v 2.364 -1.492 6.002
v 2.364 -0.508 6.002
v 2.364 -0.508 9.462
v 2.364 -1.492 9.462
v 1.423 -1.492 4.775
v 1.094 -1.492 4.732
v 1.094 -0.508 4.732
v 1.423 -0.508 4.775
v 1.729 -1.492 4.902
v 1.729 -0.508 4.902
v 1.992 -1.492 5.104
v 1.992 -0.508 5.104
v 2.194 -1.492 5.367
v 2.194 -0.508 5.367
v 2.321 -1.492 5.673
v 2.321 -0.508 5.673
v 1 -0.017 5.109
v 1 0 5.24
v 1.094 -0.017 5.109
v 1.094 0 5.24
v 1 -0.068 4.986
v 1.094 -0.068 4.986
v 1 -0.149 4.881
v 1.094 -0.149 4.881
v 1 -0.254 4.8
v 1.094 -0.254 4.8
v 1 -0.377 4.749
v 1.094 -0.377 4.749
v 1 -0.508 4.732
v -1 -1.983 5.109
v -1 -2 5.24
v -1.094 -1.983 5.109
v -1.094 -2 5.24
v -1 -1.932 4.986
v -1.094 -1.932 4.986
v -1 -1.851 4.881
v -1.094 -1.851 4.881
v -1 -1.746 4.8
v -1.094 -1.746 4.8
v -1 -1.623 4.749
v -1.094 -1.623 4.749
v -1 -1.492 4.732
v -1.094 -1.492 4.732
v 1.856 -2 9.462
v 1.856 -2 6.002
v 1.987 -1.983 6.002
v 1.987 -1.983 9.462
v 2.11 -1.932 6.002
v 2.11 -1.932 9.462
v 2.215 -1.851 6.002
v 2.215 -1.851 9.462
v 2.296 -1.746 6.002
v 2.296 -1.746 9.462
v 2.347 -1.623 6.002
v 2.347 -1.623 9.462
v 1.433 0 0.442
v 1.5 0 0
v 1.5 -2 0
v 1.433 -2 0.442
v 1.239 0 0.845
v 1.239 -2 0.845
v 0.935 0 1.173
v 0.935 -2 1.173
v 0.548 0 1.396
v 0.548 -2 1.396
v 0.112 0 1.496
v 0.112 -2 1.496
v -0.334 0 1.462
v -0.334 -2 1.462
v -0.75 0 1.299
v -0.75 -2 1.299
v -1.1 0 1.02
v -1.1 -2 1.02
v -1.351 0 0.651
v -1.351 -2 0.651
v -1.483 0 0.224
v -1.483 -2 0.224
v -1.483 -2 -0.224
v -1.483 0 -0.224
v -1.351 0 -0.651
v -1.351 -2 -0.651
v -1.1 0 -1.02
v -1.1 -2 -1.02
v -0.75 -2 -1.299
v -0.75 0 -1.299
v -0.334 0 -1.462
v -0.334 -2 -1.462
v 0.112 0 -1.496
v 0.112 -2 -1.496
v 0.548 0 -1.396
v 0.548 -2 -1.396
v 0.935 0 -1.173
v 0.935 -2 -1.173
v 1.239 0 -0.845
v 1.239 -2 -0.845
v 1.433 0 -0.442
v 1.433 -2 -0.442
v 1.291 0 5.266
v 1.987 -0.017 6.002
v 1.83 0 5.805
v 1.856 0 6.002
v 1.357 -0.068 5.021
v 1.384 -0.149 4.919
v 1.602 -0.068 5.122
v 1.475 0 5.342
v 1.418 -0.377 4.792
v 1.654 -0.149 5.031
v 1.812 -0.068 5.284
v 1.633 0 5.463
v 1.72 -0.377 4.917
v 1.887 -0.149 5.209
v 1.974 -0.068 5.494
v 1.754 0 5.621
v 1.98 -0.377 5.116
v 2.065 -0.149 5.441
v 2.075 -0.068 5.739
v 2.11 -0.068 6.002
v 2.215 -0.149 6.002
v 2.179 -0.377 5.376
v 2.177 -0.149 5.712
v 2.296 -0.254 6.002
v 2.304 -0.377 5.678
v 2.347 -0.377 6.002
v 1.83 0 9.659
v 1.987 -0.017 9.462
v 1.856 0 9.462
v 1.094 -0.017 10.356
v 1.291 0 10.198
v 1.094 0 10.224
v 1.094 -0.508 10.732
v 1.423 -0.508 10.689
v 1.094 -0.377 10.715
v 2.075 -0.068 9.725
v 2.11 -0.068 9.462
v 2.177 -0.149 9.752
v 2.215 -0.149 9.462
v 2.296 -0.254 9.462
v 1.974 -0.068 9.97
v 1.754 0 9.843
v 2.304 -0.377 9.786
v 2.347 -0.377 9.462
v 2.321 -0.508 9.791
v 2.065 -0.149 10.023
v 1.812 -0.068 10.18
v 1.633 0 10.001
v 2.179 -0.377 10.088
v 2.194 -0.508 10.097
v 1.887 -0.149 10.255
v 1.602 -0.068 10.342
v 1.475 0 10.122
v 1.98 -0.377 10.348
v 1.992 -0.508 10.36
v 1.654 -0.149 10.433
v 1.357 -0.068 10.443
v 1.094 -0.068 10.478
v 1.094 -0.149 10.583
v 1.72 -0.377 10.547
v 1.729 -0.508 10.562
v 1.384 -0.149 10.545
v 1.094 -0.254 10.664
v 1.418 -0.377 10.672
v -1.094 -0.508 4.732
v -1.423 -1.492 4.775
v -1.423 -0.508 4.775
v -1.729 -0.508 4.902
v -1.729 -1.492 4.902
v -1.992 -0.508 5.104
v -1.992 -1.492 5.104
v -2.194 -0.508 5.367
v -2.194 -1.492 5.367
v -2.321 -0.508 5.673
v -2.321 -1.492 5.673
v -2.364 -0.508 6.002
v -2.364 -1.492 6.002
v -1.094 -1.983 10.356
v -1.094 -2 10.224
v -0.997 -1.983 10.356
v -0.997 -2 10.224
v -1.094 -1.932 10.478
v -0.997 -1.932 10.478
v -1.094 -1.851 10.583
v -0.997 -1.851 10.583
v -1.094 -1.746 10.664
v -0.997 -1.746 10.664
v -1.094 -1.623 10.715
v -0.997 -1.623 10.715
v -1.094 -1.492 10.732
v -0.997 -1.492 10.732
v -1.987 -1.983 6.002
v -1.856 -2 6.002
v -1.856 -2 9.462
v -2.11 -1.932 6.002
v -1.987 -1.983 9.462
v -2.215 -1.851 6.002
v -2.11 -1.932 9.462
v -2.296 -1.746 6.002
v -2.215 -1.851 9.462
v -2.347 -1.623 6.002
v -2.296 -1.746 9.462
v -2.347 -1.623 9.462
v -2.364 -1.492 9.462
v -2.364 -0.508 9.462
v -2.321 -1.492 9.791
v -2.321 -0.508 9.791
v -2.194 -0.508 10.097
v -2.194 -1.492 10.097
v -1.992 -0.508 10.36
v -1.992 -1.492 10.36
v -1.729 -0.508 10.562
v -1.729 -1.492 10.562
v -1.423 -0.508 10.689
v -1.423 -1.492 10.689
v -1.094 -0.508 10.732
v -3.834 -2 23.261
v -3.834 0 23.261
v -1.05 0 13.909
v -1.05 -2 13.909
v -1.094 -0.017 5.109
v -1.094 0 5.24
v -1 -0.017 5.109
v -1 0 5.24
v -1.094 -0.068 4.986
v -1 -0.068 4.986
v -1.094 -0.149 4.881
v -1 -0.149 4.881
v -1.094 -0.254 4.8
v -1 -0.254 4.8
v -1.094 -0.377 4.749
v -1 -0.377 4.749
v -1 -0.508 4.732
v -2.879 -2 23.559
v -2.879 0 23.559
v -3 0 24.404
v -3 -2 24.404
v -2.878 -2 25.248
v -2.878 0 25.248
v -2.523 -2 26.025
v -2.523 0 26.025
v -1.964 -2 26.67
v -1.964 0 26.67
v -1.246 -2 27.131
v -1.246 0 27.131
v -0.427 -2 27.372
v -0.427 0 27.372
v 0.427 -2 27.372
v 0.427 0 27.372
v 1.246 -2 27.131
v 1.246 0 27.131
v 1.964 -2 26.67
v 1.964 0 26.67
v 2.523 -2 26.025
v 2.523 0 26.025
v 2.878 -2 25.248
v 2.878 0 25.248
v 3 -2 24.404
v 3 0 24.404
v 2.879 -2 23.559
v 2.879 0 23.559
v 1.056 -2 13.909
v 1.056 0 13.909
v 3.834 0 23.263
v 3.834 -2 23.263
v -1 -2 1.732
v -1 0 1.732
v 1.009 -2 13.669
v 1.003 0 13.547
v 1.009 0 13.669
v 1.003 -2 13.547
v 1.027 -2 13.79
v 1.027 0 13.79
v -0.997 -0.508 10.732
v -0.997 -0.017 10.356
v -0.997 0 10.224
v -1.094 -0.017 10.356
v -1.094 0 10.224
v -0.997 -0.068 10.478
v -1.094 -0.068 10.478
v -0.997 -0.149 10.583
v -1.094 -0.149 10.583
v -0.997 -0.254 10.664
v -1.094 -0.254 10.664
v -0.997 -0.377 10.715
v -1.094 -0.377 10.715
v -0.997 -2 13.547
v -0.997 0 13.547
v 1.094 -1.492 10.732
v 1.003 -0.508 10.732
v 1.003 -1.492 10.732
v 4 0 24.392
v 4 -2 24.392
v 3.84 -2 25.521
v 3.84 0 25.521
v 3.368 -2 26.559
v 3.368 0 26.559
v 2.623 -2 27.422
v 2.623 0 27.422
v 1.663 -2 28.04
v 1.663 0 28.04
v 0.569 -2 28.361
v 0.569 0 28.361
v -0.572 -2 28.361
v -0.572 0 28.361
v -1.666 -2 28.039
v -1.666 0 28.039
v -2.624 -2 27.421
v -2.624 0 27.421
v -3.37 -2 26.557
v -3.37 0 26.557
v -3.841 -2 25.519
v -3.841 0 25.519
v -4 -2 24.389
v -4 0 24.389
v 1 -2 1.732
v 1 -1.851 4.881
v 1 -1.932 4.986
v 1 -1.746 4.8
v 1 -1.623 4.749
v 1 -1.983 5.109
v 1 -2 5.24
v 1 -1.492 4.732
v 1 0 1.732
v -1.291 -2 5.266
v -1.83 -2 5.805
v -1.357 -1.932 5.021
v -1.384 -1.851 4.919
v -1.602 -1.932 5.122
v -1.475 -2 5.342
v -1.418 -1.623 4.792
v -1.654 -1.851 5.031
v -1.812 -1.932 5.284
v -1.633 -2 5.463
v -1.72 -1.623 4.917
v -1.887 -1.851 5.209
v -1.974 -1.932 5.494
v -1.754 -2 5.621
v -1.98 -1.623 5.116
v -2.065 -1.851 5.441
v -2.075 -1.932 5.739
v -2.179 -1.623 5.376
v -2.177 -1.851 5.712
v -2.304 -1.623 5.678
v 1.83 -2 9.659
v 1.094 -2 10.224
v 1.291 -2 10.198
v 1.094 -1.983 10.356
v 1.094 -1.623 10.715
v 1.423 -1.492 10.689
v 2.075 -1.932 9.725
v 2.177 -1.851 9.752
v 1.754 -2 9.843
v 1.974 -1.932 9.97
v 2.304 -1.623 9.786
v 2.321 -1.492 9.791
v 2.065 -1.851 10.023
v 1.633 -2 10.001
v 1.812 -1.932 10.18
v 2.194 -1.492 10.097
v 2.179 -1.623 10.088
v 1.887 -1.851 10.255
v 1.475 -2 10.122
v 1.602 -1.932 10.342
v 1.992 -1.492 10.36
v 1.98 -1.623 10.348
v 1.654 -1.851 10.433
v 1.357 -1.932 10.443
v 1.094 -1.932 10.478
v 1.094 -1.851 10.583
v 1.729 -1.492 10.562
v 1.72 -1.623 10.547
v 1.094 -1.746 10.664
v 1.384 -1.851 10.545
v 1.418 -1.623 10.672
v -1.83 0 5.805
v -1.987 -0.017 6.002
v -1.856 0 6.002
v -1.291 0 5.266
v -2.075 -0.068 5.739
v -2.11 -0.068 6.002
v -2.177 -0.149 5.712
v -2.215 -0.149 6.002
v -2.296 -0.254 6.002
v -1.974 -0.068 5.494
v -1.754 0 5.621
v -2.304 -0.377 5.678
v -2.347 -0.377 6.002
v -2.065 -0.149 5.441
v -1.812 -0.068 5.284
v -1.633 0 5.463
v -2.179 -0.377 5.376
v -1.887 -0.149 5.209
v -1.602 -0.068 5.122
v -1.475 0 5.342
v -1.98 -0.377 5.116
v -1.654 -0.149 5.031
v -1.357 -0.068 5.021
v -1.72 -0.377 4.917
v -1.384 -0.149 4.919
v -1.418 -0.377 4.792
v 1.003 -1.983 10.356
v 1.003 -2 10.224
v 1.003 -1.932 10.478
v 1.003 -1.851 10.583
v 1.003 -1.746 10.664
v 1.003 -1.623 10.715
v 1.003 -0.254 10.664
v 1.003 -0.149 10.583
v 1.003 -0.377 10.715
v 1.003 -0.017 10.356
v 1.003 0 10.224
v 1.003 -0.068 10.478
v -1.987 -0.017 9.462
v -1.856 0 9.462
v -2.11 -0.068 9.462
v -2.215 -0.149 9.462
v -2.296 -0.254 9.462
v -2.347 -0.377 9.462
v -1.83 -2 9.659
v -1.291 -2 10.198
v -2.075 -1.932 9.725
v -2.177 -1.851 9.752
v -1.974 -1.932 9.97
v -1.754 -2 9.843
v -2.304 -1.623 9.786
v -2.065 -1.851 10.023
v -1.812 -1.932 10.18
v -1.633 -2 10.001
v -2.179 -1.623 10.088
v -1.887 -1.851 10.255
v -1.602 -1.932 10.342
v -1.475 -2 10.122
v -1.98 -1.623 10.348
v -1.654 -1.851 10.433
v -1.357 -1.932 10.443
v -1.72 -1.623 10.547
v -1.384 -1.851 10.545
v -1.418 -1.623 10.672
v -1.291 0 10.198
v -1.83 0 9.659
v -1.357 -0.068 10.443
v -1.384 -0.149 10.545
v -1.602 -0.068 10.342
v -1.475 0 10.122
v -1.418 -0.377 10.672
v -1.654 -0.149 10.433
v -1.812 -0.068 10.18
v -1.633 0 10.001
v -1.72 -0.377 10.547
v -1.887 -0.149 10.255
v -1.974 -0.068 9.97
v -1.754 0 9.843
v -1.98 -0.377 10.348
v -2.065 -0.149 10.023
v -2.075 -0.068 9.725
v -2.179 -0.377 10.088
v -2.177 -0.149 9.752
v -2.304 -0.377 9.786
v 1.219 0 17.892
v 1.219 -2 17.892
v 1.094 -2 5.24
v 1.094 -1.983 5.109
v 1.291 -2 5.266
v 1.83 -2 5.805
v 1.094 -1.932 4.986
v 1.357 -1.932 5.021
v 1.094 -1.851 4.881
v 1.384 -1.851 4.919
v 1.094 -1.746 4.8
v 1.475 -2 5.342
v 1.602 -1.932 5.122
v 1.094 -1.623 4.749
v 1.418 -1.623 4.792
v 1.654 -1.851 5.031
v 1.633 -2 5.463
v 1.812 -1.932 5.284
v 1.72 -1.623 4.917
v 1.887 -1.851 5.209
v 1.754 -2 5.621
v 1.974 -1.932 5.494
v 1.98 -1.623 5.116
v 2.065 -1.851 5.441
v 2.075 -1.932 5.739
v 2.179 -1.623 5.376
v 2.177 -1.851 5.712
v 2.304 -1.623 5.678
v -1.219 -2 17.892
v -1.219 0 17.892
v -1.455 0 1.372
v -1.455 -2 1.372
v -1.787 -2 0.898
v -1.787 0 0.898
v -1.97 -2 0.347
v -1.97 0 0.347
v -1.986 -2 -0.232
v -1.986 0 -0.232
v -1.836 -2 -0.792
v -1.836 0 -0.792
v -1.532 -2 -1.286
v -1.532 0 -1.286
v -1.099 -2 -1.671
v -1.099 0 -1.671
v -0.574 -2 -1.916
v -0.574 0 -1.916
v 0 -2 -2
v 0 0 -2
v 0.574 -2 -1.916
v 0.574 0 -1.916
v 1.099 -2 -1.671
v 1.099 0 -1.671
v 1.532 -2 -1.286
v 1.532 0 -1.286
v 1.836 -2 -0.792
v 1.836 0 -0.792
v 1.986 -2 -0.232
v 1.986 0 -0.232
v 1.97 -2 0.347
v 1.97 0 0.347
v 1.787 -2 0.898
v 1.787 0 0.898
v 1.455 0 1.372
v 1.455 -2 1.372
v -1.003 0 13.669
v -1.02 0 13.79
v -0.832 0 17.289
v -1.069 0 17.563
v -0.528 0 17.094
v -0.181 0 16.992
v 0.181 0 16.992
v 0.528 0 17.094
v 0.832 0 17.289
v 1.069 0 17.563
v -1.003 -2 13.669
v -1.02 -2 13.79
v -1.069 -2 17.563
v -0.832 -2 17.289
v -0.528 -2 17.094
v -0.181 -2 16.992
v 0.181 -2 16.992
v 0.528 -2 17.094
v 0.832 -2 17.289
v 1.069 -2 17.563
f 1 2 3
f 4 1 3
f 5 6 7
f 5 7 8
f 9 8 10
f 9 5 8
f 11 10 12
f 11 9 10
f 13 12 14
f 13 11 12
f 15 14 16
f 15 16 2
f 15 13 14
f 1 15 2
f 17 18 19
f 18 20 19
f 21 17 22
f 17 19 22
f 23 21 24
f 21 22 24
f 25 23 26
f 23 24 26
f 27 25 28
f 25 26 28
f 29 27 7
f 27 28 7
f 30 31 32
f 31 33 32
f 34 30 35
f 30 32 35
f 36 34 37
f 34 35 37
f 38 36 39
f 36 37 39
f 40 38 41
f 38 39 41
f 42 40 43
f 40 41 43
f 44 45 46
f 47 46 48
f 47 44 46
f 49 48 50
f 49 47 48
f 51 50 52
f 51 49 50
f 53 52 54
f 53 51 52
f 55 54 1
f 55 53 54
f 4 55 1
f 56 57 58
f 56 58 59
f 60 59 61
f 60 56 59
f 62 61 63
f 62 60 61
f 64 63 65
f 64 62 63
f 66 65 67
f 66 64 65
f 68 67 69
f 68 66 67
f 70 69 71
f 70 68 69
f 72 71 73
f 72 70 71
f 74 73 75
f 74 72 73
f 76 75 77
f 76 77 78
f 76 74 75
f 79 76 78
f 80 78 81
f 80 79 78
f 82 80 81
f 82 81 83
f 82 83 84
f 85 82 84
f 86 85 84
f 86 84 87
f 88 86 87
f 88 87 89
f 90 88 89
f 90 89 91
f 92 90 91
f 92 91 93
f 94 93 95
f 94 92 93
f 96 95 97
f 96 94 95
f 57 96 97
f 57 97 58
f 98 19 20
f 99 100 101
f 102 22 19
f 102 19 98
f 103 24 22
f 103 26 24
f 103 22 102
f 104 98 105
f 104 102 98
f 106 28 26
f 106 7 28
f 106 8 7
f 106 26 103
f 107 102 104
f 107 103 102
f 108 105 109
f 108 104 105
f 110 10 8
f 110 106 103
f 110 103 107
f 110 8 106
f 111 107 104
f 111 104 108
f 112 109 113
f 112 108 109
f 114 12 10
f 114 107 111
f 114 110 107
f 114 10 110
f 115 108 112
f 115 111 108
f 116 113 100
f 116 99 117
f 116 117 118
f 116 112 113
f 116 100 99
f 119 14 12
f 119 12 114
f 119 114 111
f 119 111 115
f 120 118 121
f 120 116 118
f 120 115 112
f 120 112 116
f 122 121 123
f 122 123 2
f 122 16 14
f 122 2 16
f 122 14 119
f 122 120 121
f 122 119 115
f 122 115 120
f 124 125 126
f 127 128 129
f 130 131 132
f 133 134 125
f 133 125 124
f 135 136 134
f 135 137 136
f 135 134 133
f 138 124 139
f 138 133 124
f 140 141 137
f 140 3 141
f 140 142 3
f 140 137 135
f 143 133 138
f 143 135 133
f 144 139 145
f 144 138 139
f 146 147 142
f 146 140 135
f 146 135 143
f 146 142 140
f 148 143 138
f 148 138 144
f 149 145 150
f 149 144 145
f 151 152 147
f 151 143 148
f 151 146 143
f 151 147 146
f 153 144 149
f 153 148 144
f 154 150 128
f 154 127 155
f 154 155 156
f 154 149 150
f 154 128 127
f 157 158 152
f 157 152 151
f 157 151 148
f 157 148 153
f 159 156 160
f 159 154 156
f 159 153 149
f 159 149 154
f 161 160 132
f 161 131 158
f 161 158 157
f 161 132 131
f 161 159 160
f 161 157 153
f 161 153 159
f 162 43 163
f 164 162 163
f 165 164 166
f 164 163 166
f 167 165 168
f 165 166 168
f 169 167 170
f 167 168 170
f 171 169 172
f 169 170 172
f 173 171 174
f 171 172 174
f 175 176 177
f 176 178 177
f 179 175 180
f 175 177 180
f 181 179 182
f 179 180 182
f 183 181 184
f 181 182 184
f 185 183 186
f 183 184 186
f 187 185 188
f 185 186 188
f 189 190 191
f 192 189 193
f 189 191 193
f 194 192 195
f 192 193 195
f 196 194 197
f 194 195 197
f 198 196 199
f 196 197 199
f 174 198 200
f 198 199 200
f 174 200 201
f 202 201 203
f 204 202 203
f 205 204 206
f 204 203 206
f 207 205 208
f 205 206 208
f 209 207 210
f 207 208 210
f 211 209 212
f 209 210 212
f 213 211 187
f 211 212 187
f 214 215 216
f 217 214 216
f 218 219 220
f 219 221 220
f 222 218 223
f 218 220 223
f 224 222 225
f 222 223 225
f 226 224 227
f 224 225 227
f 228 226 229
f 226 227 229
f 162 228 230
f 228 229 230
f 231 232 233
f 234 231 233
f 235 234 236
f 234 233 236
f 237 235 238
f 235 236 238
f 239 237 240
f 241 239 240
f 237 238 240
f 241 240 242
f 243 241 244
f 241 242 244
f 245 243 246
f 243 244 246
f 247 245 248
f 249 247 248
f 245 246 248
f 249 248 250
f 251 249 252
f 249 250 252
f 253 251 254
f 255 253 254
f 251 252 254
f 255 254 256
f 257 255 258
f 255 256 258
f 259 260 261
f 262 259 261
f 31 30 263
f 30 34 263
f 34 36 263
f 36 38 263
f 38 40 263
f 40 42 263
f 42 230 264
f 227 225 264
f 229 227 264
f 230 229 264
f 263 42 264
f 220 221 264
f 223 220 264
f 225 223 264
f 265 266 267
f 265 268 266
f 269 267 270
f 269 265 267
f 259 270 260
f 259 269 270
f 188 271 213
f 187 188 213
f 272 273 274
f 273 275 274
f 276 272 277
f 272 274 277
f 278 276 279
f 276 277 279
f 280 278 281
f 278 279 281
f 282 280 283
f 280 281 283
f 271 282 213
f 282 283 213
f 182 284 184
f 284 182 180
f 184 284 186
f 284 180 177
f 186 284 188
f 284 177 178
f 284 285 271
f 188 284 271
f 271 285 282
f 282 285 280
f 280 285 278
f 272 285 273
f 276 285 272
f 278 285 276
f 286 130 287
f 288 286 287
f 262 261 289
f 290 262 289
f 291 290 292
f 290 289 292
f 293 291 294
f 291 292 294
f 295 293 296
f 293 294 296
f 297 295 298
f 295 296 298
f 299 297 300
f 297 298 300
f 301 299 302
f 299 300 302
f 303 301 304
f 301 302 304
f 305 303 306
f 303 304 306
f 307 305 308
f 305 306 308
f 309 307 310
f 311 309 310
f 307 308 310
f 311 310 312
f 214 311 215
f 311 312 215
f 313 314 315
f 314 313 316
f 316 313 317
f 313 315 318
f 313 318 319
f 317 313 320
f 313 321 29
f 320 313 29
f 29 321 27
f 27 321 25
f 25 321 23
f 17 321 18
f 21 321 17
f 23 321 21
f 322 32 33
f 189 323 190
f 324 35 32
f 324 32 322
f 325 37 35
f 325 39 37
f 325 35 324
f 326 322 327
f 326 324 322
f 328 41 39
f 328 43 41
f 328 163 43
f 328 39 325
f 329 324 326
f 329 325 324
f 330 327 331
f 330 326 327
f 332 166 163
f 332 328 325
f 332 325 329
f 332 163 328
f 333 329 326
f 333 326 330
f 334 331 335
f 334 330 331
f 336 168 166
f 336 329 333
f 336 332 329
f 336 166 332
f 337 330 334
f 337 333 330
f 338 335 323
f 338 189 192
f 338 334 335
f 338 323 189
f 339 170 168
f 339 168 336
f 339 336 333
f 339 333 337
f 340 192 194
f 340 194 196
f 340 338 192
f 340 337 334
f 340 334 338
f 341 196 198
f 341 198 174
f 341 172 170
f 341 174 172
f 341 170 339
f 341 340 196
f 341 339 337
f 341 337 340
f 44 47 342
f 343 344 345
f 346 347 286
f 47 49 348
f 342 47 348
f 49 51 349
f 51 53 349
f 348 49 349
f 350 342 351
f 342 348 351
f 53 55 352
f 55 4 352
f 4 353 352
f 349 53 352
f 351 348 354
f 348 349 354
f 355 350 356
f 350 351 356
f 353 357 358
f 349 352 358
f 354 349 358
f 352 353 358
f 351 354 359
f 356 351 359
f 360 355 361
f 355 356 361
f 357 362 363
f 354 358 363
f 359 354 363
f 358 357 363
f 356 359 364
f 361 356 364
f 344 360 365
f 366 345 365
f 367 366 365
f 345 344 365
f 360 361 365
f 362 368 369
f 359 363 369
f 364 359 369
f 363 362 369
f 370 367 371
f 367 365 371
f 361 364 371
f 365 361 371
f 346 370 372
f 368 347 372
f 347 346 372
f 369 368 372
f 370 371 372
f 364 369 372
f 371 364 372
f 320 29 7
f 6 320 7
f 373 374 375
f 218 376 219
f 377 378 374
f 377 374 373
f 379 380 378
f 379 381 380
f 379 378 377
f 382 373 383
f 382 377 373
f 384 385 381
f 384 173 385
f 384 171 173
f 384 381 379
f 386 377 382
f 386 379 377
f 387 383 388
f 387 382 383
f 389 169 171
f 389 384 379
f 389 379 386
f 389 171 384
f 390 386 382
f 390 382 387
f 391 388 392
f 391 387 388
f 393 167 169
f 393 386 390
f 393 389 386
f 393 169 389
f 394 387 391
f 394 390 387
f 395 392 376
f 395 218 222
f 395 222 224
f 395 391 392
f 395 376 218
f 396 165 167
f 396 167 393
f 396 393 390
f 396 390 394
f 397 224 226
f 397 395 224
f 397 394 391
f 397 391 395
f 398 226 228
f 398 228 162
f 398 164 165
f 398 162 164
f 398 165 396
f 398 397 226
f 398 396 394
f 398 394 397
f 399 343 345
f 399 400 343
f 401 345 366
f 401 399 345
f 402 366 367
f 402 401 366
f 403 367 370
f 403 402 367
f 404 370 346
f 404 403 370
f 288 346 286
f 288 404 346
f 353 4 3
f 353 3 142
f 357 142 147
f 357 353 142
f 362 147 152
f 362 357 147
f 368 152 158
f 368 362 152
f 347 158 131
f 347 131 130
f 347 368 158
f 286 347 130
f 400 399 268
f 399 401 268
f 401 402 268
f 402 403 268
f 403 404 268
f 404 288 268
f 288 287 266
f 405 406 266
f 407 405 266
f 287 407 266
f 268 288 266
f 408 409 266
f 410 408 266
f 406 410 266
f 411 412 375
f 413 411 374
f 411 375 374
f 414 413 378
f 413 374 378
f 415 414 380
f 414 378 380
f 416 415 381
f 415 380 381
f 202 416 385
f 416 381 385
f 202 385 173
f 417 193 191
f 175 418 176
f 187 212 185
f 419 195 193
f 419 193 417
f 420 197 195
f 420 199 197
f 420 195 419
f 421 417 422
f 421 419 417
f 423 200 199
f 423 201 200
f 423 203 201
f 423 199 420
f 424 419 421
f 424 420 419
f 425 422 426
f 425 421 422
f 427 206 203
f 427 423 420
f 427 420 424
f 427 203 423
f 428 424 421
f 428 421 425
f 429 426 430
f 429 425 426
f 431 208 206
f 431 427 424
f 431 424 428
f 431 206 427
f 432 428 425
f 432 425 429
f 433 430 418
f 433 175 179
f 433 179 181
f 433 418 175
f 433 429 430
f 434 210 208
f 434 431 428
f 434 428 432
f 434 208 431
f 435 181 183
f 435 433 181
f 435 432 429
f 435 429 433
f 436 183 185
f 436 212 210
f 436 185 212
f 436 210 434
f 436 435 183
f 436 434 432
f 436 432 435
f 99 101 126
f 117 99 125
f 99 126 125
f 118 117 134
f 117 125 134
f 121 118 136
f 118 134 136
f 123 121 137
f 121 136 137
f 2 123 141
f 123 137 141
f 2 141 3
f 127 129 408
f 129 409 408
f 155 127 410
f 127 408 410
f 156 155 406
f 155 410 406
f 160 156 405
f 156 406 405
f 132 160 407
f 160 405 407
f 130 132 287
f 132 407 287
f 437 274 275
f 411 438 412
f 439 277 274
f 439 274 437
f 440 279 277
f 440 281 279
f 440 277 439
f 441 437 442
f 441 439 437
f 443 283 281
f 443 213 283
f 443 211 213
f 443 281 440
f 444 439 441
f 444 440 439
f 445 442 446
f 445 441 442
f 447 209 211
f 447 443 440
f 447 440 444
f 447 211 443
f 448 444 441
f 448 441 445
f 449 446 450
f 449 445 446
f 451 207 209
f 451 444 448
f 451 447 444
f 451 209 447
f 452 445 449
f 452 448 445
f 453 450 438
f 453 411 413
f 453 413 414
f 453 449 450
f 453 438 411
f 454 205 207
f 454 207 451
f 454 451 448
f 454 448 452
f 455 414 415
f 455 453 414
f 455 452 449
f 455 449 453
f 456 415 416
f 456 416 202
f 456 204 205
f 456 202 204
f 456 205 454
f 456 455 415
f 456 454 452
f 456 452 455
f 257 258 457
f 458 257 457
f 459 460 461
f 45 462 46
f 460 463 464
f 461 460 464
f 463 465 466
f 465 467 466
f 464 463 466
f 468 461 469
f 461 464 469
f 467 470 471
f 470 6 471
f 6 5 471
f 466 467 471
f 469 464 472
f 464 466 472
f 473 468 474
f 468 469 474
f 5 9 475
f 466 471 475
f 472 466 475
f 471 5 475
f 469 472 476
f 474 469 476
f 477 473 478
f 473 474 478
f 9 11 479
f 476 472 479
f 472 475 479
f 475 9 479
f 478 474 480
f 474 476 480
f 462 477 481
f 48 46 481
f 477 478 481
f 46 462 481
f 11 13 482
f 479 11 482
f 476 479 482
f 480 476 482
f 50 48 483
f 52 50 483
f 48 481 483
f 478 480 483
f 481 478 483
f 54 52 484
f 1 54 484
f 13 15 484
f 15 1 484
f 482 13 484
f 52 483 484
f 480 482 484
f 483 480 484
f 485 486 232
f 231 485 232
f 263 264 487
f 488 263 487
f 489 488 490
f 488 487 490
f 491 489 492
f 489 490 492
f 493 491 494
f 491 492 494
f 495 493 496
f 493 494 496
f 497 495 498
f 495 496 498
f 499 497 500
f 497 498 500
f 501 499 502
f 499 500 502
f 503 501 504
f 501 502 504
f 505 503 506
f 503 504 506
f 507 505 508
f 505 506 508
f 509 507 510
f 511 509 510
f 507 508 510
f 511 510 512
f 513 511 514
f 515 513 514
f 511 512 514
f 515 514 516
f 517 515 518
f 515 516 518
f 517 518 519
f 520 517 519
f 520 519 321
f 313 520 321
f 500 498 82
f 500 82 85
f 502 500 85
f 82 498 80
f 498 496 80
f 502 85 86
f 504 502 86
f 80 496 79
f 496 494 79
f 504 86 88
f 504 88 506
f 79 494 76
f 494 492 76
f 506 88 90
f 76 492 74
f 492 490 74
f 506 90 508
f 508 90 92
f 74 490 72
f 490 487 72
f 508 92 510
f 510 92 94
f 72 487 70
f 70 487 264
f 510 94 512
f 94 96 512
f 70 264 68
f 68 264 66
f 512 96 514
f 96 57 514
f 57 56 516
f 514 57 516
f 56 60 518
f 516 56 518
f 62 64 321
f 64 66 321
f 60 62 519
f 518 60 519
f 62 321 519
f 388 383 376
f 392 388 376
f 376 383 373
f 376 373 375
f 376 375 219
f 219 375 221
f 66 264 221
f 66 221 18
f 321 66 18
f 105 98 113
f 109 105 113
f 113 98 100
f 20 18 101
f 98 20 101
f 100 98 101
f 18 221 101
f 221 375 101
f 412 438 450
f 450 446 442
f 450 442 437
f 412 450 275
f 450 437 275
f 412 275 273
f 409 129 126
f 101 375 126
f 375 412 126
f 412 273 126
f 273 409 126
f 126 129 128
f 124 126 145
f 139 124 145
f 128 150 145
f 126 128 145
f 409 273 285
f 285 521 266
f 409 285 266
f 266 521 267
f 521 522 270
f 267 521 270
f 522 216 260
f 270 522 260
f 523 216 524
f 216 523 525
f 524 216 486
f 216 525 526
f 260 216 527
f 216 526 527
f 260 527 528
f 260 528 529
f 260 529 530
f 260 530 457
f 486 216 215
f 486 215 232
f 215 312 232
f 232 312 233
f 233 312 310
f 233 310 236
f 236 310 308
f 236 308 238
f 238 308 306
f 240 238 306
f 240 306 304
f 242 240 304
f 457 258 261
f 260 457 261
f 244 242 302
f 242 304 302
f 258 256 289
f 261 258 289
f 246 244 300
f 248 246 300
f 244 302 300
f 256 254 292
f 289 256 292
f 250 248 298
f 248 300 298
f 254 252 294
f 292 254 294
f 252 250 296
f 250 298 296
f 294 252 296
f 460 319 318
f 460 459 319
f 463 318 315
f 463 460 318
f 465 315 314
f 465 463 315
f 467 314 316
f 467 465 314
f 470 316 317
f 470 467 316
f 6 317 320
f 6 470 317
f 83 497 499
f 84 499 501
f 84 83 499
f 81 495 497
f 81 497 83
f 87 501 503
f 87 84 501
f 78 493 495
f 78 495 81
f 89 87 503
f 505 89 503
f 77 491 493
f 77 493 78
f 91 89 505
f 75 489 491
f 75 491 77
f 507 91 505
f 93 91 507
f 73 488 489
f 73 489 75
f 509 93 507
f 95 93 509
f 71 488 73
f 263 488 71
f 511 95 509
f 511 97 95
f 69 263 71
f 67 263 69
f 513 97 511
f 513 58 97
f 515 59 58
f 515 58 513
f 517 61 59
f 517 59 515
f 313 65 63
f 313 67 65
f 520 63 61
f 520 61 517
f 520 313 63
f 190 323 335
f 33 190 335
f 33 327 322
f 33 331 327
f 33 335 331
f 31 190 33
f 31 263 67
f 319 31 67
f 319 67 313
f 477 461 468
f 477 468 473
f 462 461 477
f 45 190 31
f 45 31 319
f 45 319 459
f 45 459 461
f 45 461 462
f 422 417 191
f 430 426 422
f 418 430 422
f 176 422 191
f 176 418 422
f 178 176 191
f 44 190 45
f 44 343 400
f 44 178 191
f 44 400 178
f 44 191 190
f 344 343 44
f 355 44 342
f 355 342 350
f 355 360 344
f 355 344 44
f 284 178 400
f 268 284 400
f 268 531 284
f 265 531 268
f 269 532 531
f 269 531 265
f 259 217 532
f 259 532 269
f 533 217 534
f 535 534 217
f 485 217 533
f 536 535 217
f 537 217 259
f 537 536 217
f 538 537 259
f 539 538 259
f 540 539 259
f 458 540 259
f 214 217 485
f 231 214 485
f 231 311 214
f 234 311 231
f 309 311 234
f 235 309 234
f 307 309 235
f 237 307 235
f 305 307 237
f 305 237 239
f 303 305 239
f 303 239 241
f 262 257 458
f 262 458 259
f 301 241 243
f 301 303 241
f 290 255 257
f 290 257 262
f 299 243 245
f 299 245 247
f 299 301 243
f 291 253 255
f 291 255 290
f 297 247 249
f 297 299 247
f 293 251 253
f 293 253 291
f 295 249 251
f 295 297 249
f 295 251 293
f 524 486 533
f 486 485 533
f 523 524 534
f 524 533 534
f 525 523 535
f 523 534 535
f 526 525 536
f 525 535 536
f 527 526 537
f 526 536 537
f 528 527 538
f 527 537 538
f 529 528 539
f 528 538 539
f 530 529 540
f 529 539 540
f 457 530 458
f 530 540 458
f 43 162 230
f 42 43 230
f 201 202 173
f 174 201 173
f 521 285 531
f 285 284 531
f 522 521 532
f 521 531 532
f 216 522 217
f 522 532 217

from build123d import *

# Parameters (mm, degrees)
F0_R     = 1.5
F1_DEPTH = 2
F2_R     = 1.27
F3_R     = 0.508


with BuildPart() as f1:
    # F0 (on Front) → F1 (new body)
    with BuildSketch(Plane.XZ):
        with BuildLine():
            Line((-1, 4.7320508076), (-1, 1.7320508076))
            ThreePointArc((-1, 1.7320508076), (0, -2), (1, 1.7320508076))
            Line((1, 1.7320508076), (1, 4.7320508076))
            Line((1, 4.7320508076), (2.363858046, 4.7320508076))
            Line((2.363858046, 4.7320508076), (2.363858046, 10.7320508076))
            Line((2.363858046, 10.7320508076), (1.0033, 10.7320508076))
            Line((1.0033, 10.7320508076), (1.0033, 13.7320508076))
            Line((1.0033, 13.7320508076), (3.8344133108, 23.2630893134))
            ThreePointArc((3.8344133108, 23.2630893134), (-0.0012725797, 28.4020687255), (-3.8336878134, 23.2606497457))
            Line((-3.8336878134, 23.2606497457), (-0.9967, 13.7320508076))
            Line((-0.9967, 13.7320508076), (-0.9967, 10.7320508076))
            Line((-0.9967, 10.7320508076), (-2.363858046, 10.7320508076))
            Line((-2.363858046, 10.7320508076), (-2.363858046, 4.7320508076))
            Line((-2.363858046, 4.7320508076), (-1, 4.7320508076))
        make_face()
        Circle(F0_R, mode=Mode.SUBTRACT)
        with BuildLine():
            ThreePointArc((-2.8789812594, 23.5585839498), (0, 27.4020689279), (2.8789812594, 23.5585839498))
            Line((2.8789812594, 23.5585839498), (0, 13.7320508076))
            Line((0, 13.7320508076), (-2.8789812594, 23.5585839498))
        make_face(mode=Mode.SUBTRACT)
    extrude(amount=F1_DEPTH)

    # F2
    f2_edges = [f1.edges().sort_by_distance(p)[0] for p in [
        (2.363858, -1, 10.732051),
        (2.363858, -1, 4.732051),
        (-2.363858, -1, 10.732051),
        (-2.363858, -1, 4.732051),
        (0, -1, 13.732051),
        (1.0033, -1, 13.732051),
        (-0.9967, -1, 13.732051),
    ]]
    fillet(f2_edges, radius=F2_R)

    # F3
    f3_edges = [f1.edges().sort_by_distance(p)[0] for p in [
        (-1.991884, -2, 10.360076),
        (1.991884, -2, 10.360076),
        (2.363858, 0, 7.732051),
        (-2.363858, 0, 7.732051),
    ]]
    fillet(f3_edges, radius=F3_R)


solid = f1.part
